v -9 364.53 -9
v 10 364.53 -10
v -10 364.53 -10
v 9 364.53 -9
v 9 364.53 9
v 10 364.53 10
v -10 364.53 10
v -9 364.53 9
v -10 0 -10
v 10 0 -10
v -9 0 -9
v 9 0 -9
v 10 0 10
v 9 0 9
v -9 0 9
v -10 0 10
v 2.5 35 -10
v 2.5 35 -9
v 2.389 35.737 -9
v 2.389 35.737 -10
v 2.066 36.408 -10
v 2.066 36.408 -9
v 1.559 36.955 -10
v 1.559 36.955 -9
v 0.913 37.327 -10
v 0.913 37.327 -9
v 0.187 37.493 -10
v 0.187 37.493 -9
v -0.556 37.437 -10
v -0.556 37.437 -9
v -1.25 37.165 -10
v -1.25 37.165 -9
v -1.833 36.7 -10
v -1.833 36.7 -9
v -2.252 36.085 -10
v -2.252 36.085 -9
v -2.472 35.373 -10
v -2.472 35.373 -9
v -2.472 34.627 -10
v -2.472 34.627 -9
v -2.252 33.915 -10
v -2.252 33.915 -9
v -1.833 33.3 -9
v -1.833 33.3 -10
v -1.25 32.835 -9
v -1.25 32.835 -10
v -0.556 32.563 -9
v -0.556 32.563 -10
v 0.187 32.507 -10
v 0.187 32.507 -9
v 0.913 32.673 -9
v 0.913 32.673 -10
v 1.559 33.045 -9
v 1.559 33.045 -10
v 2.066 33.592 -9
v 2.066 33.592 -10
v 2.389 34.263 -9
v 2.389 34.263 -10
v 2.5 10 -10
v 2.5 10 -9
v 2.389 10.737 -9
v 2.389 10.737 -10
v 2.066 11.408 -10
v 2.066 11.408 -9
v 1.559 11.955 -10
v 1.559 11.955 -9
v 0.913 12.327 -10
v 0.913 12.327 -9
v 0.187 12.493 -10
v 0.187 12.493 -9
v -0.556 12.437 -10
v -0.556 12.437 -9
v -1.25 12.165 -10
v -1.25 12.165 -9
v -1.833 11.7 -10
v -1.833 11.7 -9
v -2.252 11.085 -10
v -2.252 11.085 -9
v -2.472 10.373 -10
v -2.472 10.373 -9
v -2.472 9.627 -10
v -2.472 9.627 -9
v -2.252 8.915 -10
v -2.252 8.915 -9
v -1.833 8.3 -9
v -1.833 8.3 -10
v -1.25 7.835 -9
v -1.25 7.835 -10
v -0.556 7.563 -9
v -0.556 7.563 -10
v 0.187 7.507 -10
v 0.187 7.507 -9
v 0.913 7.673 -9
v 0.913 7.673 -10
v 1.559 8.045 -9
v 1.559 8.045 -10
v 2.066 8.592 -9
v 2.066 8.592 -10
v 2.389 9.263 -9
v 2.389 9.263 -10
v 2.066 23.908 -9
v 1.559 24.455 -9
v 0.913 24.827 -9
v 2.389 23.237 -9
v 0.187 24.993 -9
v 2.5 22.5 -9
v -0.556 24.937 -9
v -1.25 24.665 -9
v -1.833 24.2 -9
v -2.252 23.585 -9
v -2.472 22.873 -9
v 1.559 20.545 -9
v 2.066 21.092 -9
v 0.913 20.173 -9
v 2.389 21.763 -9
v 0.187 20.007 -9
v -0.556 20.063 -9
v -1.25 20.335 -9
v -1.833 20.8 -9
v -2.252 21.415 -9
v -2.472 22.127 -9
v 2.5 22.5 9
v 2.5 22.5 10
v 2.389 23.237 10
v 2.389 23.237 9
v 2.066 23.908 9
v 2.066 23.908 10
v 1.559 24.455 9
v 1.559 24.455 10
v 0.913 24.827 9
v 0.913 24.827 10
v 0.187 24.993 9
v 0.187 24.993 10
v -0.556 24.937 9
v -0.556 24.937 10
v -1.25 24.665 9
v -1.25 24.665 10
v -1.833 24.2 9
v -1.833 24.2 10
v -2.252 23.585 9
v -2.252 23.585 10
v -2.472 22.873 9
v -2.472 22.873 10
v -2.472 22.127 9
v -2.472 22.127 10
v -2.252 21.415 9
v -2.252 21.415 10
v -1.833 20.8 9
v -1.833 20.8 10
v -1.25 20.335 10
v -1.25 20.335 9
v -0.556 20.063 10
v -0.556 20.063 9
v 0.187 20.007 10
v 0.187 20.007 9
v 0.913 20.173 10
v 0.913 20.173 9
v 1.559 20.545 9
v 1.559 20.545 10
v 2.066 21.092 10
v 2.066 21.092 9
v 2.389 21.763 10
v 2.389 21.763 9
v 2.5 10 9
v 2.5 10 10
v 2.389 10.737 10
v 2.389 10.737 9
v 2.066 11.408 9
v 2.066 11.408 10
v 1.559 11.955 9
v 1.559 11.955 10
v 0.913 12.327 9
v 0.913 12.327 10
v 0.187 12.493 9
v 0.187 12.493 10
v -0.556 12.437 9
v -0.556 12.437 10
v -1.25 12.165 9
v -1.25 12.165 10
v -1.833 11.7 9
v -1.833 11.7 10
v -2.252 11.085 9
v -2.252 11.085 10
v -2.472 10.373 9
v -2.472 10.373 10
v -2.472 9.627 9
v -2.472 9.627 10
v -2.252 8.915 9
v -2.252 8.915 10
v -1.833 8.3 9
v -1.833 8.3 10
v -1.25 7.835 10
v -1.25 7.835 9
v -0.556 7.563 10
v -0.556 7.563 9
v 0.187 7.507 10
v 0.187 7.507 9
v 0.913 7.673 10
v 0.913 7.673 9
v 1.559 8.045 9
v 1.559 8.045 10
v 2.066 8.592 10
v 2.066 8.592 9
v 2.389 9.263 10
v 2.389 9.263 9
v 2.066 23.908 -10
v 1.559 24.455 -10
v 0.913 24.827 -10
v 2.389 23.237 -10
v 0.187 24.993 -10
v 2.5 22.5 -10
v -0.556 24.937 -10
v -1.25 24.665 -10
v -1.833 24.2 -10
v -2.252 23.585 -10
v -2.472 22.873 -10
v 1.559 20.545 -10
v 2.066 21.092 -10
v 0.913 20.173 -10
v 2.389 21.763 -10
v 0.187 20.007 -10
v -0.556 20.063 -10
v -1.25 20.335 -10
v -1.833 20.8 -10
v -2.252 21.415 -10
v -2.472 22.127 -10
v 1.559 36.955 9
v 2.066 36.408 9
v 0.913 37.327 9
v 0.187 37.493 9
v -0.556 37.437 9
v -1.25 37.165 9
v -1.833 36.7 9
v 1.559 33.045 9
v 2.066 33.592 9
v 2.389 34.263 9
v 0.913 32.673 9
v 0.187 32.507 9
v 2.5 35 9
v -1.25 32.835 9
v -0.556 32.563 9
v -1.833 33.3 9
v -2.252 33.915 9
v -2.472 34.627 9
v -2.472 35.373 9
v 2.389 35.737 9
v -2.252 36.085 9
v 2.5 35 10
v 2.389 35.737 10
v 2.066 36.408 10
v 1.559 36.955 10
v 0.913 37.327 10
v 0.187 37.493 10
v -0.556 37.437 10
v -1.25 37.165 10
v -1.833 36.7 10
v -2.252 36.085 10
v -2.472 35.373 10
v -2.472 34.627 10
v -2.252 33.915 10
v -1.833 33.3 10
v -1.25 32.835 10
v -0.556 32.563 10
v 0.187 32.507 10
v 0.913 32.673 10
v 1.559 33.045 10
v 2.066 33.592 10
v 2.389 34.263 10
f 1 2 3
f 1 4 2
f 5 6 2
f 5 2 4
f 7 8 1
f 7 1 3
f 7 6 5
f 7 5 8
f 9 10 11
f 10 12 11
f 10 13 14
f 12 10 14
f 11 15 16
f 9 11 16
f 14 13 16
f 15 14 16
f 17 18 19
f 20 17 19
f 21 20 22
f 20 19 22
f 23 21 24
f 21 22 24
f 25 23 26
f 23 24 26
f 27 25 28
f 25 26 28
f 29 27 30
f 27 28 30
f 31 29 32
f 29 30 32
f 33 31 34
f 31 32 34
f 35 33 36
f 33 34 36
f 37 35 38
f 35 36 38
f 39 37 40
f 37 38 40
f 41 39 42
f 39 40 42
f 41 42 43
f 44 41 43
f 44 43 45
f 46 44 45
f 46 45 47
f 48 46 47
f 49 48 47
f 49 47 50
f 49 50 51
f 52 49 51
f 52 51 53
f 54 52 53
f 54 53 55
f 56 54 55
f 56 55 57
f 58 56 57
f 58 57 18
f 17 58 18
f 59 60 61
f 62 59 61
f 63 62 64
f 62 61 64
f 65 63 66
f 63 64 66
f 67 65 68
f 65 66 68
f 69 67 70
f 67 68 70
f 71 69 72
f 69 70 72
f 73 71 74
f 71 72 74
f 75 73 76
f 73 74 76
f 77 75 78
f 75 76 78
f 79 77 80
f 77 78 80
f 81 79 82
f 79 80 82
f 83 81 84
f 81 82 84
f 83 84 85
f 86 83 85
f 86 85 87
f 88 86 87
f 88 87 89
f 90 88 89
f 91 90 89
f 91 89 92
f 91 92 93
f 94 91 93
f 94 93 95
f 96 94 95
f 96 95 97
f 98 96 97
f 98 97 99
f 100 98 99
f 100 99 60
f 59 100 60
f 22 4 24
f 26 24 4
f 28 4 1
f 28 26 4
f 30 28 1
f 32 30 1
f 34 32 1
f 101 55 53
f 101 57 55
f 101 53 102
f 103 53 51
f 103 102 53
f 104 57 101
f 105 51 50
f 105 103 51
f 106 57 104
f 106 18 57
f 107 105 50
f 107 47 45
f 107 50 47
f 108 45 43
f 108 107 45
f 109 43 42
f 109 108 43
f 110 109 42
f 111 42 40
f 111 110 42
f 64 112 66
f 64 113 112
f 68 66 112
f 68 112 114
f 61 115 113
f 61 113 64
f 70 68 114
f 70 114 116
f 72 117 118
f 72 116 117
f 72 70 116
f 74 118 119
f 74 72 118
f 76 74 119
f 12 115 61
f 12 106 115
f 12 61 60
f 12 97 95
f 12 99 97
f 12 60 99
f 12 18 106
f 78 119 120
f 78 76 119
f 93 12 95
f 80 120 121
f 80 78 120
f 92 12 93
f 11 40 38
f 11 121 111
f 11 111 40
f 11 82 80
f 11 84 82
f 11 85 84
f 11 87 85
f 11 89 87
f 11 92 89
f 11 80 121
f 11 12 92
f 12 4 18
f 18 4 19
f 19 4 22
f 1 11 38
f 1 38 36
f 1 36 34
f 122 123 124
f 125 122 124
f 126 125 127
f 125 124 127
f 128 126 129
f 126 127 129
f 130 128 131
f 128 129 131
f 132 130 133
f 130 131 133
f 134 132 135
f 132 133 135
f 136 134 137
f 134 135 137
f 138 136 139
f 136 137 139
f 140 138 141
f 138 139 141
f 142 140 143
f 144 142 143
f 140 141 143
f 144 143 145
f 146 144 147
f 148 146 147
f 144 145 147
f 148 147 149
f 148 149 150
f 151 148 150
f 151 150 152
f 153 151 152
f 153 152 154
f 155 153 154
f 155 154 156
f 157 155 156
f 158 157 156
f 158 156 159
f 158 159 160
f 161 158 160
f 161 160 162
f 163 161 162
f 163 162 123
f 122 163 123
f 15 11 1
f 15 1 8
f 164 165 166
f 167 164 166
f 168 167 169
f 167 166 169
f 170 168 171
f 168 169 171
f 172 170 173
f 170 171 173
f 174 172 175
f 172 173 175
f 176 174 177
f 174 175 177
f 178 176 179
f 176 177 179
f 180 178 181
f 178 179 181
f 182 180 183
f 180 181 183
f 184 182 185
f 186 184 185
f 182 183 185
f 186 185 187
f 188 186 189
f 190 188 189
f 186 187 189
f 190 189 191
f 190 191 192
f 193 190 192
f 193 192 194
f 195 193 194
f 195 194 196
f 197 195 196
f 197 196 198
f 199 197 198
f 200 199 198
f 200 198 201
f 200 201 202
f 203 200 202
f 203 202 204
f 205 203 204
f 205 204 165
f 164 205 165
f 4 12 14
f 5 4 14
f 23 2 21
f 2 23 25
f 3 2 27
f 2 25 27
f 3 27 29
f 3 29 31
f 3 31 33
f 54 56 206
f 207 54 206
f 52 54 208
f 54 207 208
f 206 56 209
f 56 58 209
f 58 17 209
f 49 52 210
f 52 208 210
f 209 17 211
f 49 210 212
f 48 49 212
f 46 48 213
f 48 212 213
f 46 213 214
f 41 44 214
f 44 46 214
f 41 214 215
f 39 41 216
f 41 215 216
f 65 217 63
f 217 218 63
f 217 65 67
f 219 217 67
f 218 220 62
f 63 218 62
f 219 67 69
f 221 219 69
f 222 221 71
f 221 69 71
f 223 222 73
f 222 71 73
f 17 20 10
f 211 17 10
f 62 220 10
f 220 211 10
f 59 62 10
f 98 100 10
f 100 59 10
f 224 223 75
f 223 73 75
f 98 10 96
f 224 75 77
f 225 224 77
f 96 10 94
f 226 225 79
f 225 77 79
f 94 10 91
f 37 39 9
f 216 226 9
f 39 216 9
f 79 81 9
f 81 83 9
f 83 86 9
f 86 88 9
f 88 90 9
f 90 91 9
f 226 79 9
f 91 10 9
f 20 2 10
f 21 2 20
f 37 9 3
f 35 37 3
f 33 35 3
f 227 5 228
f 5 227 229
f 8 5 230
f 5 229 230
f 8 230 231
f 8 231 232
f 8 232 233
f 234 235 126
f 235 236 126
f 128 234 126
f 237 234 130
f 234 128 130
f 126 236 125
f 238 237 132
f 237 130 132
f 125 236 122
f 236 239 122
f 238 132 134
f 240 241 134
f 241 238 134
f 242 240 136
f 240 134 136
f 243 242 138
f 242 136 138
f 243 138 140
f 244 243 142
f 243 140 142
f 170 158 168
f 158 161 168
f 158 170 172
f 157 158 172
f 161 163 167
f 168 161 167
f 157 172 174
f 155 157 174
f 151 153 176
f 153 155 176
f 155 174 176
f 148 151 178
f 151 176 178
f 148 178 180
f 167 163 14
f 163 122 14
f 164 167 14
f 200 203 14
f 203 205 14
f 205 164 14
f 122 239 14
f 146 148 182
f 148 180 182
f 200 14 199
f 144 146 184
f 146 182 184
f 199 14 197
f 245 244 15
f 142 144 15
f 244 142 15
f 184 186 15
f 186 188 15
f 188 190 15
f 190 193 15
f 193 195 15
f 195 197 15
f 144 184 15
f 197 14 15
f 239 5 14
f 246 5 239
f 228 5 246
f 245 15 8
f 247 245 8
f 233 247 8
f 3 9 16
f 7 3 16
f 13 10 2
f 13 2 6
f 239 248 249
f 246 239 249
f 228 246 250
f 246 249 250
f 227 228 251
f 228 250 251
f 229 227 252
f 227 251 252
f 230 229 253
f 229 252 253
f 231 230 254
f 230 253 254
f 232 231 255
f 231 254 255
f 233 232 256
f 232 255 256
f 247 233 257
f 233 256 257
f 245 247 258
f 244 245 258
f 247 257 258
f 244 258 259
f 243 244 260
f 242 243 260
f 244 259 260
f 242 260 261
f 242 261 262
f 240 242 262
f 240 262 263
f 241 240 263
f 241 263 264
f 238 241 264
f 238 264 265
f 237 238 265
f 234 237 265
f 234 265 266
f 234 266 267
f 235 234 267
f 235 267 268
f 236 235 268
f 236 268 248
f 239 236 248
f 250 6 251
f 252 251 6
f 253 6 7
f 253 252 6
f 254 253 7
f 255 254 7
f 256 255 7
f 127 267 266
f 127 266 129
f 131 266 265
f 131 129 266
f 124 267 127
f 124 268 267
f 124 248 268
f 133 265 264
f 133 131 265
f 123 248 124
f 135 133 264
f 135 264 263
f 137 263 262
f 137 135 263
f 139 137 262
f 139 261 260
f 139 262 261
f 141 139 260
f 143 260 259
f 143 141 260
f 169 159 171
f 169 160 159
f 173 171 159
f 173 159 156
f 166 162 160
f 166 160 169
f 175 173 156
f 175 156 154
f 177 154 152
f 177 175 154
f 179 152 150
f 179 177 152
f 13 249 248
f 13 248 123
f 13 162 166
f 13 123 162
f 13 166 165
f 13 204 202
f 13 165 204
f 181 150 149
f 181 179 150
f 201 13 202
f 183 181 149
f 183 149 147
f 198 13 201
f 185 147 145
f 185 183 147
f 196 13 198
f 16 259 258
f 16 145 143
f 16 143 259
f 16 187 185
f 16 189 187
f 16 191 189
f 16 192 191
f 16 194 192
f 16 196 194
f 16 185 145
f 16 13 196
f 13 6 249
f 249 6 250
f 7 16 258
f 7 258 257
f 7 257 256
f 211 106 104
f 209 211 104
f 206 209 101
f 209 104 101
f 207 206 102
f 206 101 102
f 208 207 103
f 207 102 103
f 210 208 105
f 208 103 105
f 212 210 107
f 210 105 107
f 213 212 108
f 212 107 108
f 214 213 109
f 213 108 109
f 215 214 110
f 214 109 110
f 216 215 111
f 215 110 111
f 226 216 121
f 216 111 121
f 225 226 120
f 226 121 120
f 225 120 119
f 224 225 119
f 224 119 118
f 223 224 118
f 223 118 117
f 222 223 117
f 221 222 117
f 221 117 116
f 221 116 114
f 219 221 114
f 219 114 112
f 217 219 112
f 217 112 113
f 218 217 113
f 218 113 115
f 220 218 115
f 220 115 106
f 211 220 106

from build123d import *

# Parameters (mm, degrees)
SKETCH1_W             = 20
SKETCH1_H             = 20
SKETCH1_W_2           = 18
SKETCH1_H_2           = 18
F_20_X_20_X_2_1_DEPTH = 364.53
SKETCH_2_R            = 2.5
CUT_EXTRUDE_1_DEPTH   = 366.215170687


with BuildPart() as part:
    # Sketch1 → 方形管 20 X 20 X 2(1) (new body)
    with BuildSketch(Plane(origin=(0, 0, 0), x_dir=(-1, 0, 0), z_dir=(0, 1, 0))):
        Rectangle(SKETCH1_W, SKETCH1_H)
        Rectangle(SKETCH1_W_2, SKETCH1_H_2, mode=Mode.SUBTRACT)
    extrude(amount=F_20_X_20_X_2_1_DEPTH)

    # 草图2 → 切除-拉伸1 (cut, through all)
    with BuildSketch(Plane.XY.offset(10)):
        with Locations((0, 10)):
            Circle(SKETCH_2_R)
        with Locations((0, 22.5)):
            Circle(SKETCH_2_R)
        with Locations((0, 35)):
            Circle(SKETCH_2_R)
    extrude(amount=-CUT_EXTRUDE_1_DEPTH, mode=Mode.SUBTRACT)


solid = part.part
